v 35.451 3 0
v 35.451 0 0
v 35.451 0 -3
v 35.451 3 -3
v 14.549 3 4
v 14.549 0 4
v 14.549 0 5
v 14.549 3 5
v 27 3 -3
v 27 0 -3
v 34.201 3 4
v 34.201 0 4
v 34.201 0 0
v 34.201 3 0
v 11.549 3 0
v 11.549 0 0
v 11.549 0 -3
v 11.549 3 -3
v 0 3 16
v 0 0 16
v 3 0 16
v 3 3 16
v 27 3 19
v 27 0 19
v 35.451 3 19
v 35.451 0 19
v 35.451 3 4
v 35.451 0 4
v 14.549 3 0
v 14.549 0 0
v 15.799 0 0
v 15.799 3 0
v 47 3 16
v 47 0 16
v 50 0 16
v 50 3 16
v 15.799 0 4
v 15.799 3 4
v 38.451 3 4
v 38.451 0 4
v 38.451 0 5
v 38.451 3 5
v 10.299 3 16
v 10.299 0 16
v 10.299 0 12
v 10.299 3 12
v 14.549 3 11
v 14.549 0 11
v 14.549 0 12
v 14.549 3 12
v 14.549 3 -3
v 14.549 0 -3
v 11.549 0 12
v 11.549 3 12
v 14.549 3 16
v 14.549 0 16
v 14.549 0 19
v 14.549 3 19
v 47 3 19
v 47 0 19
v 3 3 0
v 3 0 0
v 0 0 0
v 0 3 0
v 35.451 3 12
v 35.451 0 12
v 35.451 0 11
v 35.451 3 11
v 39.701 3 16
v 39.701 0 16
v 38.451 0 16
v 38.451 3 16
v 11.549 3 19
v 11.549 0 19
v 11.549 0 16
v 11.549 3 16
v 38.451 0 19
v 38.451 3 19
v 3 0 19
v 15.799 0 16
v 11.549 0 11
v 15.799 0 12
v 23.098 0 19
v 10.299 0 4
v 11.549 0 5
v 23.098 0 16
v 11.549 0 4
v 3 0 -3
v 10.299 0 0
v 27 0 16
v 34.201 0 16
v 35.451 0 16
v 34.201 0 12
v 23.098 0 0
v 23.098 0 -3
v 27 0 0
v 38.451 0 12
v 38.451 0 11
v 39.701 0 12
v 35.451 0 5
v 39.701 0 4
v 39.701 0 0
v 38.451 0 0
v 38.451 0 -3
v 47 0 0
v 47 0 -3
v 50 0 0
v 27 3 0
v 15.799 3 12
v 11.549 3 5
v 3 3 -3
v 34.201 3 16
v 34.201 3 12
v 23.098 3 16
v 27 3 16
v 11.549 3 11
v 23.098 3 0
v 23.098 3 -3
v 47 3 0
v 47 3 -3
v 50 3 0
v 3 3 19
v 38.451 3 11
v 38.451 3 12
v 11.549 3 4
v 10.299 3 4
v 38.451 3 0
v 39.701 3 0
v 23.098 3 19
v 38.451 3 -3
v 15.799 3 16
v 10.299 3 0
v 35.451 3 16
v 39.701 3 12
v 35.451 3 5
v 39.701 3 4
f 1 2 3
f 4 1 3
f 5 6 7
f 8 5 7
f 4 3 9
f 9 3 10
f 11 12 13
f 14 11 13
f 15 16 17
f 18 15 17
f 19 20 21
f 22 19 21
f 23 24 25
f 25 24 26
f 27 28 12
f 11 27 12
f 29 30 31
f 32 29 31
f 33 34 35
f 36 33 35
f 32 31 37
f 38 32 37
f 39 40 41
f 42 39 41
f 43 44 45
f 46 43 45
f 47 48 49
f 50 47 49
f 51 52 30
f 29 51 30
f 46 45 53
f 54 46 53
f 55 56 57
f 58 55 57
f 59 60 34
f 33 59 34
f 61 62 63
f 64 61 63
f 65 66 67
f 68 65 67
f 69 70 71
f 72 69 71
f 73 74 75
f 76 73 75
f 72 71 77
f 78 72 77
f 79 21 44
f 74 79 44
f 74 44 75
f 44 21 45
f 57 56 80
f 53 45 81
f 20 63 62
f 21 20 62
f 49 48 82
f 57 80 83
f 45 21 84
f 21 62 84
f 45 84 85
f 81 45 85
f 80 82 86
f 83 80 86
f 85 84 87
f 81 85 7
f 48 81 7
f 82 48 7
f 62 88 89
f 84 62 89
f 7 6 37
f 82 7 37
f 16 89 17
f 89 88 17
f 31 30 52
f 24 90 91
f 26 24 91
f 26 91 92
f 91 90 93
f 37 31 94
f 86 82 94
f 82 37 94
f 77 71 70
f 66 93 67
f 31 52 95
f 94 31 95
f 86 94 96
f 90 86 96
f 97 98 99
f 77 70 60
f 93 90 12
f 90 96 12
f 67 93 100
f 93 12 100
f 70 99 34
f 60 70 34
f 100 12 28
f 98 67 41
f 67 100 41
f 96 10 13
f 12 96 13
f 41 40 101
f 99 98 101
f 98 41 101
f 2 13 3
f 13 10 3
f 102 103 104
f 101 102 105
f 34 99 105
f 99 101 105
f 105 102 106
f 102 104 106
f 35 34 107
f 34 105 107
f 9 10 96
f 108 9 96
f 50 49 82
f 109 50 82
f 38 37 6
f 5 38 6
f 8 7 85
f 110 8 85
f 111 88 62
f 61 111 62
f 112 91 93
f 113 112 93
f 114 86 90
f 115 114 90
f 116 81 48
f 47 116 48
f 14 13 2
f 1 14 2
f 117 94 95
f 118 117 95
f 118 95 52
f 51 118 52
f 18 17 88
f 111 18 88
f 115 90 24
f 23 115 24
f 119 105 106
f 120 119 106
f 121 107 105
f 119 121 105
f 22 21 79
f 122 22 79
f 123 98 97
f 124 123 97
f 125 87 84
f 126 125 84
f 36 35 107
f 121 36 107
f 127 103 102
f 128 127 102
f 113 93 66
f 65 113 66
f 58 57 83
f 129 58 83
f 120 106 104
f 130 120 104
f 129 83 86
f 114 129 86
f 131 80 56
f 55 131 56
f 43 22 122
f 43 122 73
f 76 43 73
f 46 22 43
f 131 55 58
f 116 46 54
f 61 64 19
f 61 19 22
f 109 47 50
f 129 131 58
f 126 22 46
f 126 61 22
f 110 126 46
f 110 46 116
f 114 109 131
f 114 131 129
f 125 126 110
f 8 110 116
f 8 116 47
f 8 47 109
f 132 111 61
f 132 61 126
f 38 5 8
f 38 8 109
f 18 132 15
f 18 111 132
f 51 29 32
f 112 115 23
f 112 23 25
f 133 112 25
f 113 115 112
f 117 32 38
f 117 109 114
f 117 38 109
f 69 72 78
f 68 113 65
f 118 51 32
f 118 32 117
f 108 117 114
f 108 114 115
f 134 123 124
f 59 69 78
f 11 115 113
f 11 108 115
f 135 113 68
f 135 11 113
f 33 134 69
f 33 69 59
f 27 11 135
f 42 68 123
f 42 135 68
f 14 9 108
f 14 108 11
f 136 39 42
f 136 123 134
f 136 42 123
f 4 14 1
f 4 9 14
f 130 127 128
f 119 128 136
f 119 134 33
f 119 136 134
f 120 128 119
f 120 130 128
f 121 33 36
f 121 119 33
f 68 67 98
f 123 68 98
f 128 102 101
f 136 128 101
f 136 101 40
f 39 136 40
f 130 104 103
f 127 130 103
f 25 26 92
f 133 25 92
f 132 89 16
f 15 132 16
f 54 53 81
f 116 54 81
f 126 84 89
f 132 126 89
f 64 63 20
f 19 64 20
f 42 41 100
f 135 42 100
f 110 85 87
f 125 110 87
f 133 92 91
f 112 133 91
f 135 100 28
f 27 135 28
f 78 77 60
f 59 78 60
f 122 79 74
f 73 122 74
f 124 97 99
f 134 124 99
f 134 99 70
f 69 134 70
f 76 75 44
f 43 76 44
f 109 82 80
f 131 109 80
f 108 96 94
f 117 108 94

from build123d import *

# Parameters (mm, degrees)
EXTRUDE_1_DEPTH = 3


with BuildPart() as part:
    # 草图1 → 凸台-拉伸1 (new body)
    with BuildSketch(Plane(origin=(0, 0, 0), x_dir=(1, 0, 0), z_dir=(0, 1, 0))):
        Polygon((25, -8), (25, 0), (23.098111609, 0), (15.799055804, 0), (15.799055804, -4), (14.549055804, -4), (14.549055804, -5), (11.549055804, -5), (11.549055804, -4), (10.299055804, -4), (10.299055804, 0), (3, 0), (0, 0), (0, -8), align=None)
        Polygon((25, -16), (25, -8), (0, -8), (0, -16), (3, -16), (10.299055804, -16), (10.299055804, -12), (11.549055804, -12), (11.549055804, -11), (14.549055804, -11), (14.549055804, -12), (15.799055804, -12), (15.799055804, -16), (23.098111609, -16), align=None)
        Polygon((23.098111609, -19), (23.098111609, -16), (15.799055804, -16), (14.549055804, -16), (14.549055804, -19), align=None)
        Polygon((10.299055804, -16), (3, -16), (3, -19), (11.549055804, -19), (11.549055804, -16), align=None)
        Polygon((3, 3), (3, 0), (10.299055804, 0), (11.549055804, 0), (11.549055804, 3), align=None)
        Polygon((15.799055804, 0), (23.098111609, 0), (23.098111609, 3), (14.549055804, 3), (14.549055804, 0), align=None)
        Polygon((27, 3), (27, 0), (34.200944196, 0), (35.450944196, 0), (35.450944196, 3), align=None)
        Polygon((39.700944196, 0), (47, 0), (47, 3), (38.450944196, 3), (38.450944196, 0), align=None)
        Polygon((27, 0), (25, 0), (25, -8), (50, -8), (50, 0), (47, 0), (39.700944196, 0), (39.700944196, -4), (38.450944196, -4), (38.450944196, -5), (35.450944196, -5), (35.450944196, -4), (34.200944196, -4), (34.200944196, 0), align=None)
        Polygon((50, -8), (25, -8), (25, -16), (27, -16), (34.200944196, -16), (34.200944196, -12), (35.450944196, -12), (35.450944196, -11), (38.450944196, -11), (38.450944196, -12), (39.700944196, -12), (39.700944196, -16), (47, -16), (50, -16), align=None)
        Polygon((34.200944196, -16), (27, -16), (27, -19), (35.450944196, -19), (35.450944196, -16), align=None)
        Polygon((47, -19), (47, -16), (39.700944196, -16), (38.450944196, -16), (38.450944196, -19), align=None)
    extrude(amount=EXTRUDE_1_DEPTH)


solid = part.part
